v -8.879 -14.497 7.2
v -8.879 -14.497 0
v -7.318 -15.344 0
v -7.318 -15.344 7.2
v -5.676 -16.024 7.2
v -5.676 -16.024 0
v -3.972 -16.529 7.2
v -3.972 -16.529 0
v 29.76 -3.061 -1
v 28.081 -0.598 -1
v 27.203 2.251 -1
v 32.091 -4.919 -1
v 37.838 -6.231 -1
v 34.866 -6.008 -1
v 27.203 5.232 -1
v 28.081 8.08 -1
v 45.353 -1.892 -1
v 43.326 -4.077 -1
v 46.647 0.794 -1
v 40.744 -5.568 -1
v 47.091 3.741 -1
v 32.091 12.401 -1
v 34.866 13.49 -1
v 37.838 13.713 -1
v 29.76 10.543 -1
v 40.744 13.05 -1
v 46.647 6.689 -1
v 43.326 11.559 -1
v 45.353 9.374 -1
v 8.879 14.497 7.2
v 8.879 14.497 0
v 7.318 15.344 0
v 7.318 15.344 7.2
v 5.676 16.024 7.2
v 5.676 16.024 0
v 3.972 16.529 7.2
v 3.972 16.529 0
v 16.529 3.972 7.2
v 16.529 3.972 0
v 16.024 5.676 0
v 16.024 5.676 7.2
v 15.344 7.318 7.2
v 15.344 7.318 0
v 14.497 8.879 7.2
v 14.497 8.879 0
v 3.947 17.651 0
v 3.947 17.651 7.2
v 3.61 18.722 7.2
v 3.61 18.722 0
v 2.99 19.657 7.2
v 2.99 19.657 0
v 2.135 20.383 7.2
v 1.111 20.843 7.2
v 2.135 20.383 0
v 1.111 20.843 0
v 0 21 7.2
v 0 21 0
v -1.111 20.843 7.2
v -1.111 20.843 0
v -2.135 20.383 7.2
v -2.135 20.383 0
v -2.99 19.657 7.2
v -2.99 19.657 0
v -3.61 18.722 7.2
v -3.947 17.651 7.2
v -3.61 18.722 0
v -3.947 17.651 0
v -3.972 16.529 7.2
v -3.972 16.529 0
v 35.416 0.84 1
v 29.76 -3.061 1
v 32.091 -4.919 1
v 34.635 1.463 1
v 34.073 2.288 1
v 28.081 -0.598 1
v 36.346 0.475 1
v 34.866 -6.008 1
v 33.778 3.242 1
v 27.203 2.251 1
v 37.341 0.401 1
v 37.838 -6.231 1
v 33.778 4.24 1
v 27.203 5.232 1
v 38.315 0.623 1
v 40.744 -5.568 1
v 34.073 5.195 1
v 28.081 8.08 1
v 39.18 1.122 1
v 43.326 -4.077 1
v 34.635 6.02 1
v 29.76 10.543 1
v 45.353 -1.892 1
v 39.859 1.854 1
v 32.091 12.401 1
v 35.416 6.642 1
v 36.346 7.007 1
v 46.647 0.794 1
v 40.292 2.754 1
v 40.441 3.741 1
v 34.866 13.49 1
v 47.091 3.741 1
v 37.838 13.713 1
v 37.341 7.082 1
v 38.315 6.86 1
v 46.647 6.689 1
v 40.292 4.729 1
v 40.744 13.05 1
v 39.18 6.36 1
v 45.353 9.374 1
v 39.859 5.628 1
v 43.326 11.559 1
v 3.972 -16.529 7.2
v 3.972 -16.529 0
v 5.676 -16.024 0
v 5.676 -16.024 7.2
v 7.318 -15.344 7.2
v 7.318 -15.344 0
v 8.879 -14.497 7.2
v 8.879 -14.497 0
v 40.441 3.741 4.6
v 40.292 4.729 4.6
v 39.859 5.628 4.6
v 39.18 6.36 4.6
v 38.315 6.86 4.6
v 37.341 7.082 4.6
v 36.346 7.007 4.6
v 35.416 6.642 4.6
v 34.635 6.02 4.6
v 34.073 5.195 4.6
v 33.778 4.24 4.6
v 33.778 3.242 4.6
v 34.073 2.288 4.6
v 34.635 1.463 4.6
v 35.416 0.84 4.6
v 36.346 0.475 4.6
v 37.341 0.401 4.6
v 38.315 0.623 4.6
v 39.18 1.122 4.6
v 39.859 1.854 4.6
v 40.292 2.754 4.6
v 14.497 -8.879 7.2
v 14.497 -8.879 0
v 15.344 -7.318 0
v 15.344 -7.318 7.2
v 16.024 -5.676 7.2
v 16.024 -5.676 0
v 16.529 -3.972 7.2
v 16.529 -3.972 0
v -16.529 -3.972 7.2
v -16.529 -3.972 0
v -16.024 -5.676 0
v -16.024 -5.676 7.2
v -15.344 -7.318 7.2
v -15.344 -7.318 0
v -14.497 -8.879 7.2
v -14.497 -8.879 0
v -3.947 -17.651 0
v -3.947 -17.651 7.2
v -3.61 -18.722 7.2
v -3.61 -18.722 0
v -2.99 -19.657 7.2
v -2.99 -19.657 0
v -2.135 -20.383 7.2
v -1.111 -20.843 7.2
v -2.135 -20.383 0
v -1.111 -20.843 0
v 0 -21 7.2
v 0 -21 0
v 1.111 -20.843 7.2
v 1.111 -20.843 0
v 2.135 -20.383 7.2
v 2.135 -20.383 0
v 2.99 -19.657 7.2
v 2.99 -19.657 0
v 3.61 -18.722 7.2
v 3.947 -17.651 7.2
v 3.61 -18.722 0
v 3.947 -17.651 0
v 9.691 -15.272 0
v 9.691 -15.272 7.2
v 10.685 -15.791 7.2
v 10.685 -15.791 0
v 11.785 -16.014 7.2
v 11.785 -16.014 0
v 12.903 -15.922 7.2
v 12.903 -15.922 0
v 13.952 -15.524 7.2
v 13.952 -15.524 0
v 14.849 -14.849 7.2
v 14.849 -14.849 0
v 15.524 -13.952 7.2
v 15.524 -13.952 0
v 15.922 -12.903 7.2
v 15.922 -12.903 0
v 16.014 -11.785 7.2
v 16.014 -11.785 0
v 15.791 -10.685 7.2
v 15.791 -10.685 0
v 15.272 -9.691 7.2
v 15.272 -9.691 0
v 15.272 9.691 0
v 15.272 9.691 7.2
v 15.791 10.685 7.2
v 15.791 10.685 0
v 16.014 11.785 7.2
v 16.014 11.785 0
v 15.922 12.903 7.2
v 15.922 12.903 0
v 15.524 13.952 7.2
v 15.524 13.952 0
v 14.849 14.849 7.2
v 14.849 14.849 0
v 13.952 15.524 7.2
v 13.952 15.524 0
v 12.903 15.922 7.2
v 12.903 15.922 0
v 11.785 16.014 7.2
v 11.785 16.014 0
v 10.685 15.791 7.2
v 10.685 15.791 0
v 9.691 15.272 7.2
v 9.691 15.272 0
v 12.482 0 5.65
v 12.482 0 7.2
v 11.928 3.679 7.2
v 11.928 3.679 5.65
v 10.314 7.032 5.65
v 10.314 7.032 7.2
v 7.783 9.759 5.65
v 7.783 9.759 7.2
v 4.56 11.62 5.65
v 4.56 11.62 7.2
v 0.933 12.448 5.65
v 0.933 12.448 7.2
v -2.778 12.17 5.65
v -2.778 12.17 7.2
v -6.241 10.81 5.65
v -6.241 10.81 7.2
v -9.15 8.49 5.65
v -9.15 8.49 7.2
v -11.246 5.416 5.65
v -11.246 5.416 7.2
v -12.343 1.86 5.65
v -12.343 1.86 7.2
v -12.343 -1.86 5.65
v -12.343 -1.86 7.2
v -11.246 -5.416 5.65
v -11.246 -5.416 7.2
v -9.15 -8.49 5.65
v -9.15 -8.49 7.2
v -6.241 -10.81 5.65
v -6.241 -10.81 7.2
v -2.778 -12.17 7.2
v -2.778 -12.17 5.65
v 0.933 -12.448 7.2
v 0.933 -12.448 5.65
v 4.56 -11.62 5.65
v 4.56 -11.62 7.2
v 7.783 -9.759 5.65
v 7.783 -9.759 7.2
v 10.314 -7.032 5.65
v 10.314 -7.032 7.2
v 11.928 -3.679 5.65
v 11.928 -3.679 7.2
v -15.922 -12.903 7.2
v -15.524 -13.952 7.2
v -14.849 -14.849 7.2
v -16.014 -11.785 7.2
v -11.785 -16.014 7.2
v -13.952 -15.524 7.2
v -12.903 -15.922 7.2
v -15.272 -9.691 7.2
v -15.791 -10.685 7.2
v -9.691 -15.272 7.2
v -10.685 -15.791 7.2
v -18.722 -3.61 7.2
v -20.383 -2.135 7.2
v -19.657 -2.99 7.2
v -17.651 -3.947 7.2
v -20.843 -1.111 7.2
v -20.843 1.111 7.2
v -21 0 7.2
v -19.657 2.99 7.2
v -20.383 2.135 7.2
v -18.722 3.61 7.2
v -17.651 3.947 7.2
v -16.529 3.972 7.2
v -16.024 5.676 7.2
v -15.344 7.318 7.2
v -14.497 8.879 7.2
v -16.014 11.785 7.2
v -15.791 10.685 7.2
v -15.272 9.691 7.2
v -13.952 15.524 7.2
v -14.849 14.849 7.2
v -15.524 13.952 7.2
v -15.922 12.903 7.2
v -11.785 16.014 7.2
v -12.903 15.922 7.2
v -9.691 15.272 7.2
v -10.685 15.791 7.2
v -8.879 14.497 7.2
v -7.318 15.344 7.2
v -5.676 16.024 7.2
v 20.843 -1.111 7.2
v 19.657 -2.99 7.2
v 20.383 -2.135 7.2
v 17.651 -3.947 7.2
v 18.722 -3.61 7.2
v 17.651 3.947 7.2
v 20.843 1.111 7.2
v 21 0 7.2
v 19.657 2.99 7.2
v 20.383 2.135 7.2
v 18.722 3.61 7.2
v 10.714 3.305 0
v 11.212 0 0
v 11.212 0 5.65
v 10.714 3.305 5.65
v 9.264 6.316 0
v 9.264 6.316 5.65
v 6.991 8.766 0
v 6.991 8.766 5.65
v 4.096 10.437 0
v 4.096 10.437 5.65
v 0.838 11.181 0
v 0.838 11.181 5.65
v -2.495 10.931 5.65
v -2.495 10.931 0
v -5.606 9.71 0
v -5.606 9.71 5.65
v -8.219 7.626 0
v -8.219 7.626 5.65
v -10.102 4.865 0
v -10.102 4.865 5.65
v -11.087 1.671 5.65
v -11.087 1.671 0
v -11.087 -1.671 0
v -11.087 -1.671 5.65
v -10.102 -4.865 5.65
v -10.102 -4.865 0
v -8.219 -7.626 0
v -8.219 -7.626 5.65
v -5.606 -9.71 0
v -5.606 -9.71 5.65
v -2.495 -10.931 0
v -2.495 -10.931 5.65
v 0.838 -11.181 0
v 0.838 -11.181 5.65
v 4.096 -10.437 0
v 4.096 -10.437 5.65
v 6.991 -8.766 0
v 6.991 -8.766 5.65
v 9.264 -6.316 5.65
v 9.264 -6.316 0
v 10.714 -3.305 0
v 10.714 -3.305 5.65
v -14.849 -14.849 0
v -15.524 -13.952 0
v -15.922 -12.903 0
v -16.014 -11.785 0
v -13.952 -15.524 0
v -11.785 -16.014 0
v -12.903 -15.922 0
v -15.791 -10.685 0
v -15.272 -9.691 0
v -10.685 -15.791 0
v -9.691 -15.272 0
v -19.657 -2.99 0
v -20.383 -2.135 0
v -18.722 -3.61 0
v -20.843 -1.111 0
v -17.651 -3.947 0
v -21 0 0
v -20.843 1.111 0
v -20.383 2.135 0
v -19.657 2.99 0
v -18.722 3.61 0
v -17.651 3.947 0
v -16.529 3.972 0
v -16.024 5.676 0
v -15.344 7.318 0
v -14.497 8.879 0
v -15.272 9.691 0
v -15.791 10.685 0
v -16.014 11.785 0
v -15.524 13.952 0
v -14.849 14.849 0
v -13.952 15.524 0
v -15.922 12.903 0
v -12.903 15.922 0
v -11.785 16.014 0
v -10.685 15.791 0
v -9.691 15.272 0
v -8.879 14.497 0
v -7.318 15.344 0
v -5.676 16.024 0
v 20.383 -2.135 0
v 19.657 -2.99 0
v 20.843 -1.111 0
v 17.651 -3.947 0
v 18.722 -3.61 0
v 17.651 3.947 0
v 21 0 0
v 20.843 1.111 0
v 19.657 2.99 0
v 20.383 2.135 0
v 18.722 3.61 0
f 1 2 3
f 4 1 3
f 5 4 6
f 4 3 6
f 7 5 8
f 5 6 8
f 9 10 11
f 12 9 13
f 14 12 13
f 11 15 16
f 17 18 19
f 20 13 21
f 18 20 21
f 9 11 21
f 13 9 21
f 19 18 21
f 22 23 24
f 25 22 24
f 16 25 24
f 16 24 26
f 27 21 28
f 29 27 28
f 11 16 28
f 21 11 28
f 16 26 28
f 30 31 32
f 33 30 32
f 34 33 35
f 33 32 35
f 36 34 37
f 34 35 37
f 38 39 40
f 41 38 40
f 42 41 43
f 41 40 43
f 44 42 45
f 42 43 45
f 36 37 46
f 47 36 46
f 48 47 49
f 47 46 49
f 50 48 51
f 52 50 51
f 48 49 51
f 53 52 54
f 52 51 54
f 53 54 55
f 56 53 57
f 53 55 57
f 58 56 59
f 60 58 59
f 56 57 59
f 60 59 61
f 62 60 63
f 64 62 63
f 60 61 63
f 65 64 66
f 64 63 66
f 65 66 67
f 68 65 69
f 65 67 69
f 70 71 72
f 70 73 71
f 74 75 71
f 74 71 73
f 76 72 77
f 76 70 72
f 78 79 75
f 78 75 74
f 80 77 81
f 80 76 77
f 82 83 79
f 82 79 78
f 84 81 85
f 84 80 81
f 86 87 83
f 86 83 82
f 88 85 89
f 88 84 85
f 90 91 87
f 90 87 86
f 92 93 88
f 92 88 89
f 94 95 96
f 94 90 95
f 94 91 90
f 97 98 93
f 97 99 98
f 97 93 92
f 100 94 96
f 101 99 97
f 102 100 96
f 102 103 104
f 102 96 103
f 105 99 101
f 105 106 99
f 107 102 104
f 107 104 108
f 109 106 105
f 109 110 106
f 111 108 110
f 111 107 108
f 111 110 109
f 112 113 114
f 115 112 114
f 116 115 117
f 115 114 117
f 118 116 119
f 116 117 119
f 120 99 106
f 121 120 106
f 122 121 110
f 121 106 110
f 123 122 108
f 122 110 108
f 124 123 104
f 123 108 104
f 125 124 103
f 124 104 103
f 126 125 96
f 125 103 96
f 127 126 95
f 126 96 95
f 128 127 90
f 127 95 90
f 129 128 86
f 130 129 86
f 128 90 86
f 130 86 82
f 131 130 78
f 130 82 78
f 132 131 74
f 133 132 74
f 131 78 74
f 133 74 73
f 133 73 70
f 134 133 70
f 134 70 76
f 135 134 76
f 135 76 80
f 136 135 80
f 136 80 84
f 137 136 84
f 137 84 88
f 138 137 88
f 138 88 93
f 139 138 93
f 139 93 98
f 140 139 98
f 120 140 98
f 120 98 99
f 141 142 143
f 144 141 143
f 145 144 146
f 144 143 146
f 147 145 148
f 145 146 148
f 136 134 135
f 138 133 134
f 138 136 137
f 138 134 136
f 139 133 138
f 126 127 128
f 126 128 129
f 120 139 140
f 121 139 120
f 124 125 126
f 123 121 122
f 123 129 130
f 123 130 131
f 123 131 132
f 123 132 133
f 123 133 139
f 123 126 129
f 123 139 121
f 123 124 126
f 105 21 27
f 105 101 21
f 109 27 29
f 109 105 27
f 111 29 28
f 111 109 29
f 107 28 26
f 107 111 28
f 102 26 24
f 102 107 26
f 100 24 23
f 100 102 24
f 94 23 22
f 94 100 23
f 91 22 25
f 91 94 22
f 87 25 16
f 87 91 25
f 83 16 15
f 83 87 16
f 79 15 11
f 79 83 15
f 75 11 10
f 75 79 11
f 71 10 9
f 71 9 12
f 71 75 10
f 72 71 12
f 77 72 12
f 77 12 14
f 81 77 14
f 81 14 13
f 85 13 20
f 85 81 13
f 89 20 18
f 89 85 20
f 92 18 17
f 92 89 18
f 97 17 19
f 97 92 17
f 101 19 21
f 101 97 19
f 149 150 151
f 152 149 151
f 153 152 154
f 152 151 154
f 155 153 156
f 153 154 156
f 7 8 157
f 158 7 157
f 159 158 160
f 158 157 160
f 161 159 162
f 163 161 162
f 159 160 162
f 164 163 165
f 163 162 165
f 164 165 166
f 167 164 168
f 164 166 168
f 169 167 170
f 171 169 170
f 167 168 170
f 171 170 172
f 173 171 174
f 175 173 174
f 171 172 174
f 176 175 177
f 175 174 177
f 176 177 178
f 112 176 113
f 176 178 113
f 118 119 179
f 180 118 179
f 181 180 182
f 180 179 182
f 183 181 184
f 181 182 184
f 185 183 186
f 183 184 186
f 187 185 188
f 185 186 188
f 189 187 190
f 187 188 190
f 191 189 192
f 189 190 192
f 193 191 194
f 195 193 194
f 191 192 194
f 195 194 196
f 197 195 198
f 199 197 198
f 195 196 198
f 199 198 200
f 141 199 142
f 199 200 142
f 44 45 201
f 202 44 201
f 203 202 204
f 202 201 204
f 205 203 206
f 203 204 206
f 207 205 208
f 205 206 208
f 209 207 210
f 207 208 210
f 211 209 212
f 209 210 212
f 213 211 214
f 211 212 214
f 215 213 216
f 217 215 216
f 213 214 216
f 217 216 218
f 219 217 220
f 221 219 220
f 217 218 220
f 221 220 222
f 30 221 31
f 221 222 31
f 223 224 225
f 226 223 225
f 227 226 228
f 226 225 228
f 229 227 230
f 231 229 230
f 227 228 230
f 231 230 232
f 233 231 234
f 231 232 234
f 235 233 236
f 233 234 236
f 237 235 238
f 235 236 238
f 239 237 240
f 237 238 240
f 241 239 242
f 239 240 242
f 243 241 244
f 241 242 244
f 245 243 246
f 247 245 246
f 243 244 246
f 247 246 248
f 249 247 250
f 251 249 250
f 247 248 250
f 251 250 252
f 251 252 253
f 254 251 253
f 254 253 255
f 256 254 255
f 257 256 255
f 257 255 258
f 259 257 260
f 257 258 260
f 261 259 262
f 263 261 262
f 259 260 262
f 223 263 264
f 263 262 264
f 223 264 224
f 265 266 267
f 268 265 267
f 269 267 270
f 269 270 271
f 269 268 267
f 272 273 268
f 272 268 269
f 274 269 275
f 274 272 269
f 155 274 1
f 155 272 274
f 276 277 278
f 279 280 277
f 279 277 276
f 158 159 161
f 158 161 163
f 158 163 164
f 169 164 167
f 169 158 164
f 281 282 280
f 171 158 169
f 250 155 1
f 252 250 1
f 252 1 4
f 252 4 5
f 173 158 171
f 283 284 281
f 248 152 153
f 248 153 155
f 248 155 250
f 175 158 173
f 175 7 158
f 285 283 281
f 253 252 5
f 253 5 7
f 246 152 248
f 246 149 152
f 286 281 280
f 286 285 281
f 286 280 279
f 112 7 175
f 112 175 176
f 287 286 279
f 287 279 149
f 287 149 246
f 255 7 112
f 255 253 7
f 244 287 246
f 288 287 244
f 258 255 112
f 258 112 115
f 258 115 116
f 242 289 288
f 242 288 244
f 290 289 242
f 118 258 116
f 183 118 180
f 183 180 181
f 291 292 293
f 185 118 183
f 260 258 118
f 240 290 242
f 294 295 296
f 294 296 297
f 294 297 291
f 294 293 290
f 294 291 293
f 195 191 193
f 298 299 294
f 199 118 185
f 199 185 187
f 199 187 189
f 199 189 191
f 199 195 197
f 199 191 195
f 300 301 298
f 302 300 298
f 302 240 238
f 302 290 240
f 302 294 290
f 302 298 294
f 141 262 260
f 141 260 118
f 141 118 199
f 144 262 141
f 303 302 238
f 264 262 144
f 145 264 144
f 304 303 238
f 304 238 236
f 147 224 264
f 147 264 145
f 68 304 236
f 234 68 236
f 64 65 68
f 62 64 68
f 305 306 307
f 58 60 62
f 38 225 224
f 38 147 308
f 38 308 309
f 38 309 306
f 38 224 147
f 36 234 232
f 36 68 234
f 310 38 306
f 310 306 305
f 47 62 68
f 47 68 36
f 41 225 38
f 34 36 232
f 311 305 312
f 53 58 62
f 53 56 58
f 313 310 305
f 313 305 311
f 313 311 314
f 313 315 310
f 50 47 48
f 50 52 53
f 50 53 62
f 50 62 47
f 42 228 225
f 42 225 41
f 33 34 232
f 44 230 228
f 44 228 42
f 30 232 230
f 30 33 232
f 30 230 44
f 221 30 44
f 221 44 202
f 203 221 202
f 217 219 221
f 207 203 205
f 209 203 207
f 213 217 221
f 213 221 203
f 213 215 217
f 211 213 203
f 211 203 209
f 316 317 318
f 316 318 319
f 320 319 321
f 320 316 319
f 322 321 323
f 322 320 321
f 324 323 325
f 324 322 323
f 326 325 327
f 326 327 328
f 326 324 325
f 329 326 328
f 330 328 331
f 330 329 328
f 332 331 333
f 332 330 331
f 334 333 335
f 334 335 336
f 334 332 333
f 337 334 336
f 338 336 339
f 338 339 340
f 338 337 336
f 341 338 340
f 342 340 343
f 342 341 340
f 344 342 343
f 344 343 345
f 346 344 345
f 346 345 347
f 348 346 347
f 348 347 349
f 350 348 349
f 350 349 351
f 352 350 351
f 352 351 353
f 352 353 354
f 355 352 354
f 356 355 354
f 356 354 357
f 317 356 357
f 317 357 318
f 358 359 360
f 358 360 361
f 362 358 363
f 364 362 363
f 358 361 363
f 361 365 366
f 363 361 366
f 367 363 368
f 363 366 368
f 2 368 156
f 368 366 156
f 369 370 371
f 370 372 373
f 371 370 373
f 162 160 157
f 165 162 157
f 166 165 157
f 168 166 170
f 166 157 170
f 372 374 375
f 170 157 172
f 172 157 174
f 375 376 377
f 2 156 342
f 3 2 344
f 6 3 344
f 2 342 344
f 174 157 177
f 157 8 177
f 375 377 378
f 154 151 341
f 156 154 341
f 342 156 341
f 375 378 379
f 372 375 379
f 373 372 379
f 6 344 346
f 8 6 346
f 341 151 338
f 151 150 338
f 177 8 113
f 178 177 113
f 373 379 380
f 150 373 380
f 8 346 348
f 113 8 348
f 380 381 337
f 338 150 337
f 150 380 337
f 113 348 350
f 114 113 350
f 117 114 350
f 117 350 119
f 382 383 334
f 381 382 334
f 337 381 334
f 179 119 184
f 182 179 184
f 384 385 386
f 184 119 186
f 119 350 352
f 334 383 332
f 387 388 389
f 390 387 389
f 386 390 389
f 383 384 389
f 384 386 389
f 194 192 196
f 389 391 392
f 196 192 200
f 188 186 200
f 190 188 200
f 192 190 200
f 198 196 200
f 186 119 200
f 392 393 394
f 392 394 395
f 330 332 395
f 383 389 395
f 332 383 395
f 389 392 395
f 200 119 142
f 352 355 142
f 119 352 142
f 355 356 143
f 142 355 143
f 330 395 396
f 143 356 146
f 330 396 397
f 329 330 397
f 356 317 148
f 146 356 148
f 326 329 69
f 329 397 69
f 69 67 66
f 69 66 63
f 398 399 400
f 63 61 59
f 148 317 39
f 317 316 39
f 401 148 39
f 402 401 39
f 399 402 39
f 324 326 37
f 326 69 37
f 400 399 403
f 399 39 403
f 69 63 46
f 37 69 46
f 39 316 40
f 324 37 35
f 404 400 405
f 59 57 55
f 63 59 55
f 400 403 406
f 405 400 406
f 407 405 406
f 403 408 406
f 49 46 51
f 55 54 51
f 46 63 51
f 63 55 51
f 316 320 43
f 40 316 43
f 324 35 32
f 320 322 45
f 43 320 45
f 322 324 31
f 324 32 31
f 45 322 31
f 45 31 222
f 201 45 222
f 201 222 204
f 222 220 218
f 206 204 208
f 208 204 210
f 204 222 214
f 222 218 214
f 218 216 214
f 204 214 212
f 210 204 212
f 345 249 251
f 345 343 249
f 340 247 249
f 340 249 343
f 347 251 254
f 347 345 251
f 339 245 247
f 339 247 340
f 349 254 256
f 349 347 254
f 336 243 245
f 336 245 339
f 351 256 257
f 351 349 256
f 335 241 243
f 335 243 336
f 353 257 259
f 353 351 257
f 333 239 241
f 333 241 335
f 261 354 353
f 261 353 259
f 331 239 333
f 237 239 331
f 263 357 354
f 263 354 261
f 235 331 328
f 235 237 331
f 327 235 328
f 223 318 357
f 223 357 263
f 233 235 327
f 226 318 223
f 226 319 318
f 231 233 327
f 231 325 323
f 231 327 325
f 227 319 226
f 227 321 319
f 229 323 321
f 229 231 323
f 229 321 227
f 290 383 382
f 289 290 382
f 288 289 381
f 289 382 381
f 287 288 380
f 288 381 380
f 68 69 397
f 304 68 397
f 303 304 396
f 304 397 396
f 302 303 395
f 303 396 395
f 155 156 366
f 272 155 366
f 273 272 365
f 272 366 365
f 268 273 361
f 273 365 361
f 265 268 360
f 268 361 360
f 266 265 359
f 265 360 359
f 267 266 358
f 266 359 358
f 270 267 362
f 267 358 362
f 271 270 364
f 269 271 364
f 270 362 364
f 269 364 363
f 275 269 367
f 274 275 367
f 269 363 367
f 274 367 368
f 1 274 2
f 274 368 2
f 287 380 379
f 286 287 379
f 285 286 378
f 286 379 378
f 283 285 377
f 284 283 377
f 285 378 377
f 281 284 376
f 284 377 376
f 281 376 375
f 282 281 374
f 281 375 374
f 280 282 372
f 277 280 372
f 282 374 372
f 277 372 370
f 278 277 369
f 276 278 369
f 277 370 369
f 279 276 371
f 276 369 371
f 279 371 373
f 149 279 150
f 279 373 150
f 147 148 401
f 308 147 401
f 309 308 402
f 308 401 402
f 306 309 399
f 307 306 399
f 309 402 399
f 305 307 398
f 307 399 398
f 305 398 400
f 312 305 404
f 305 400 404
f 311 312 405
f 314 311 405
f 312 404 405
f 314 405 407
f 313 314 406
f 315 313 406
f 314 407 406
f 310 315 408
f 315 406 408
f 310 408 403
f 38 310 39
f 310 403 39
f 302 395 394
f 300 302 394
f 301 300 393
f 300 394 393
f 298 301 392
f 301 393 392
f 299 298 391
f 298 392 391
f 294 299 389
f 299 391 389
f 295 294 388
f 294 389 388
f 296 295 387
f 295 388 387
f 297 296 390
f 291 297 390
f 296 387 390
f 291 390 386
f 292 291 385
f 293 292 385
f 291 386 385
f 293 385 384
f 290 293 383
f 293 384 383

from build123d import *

# Parameters (mm, degrees)
F0_R      = 4.6625
F1_DEPTH  = 7.2
F0_R_2    = 11.2125
F2_R      = 12.4825
F2_R_2    = 11.2125
F3_DEPTH  = 1.55
F4_R      = 5.8
F5_DEPTH  = 1
F6_DEPTH  = 8.4
F7_R      = 3.5
F8_DEPTH  = 25
F9_R      = 10
F9_R_2    = 3.35
F10_DEPTH = 1
F11_DEPTH = 4.6
F12_DEPTH = 1
F13_DEPTH = 1


with BuildPart() as f1:
    # F0 (on Top) → F1 (new body)
    with BuildSketch(Plane.XY):
        Circle(F0_R)
    extrude(amount=F1_DEPTH)

    # F4 (on Top) → F5 (join)
    with BuildSketch(Plane.XY):
        Circle(F4_R)
    extrude(amount=F5_DEPTH)

    # F0 (on Top) → F6 (join)
    with BuildSketch(Plane.XY):
        Circle(F0_R)
    extrude(amount=F6_DEPTH)

    # F7 (on face) → F8 (cut)
    with BuildSketch(Plane.XY.offset(8.4)):
        Circle(F7_R)
    extrude(amount=-F8_DEPTH, mode=Mode.SUBTRACT)

    # F12 (add): a face of the model
    f12_faces = [f1.faces().sort_by_distance(p)[0] for p in [
        (-5.6359512268, 0, 0),
    ]]
    extrude(f12_faces, amount=F12_DEPTH)


with BuildPart() as f1b:
    # F0 (on Top) → F1, piece 2 (new body)
    with BuildSketch(Plane.XY):
        with BuildLine():
            ThreePointArc((-8.8792741158, 14.4968441799), (-14.8492424049, 14.8492424049), (-14.4968441799, 8.8792741158))
            ThreePointArc((-14.4968441799, 8.8792741158), (-15.7059520527, 6.5056183502), (-16.5294117647, 3.9722218861))
            ThreePointArc((-16.5294117647, 3.9722218861), (-21, 0), (-16.5294117647, -3.9722218861))
            ThreePointArc((-16.5294117647, -3.9722218861), (-15.7059520527, -6.5056183502), (-14.4968441799, -8.8792741158))
            ThreePointArc((-14.4968441799, -8.8792741158), (-14.8492424049, -14.8492424049), (-8.8792741158, -14.4968441799))
            ThreePointArc((-8.8792741158, -14.4968441799), (-6.5056183502, -15.7059520527), (-3.9722218861, -16.5294117647))
            ThreePointArc((-3.9722218861, -16.5294117647), (0, -21), (3.9722218861, -16.5294117647))
            ThreePointArc((3.9722218861, -16.5294117647), (6.5056183502, -15.7059520527), (8.8792741158, -14.4968441799))
            ThreePointArc((8.8792741158, -14.4968441799), (14.8492424049, -14.8492424049), (14.4968441799, -8.8792741158))
            ThreePointArc((14.4968441799, -8.8792741158), (15.7059520527, -6.5056183502), (16.5294117647, -3.9722218861))
            ThreePointArc((16.5294117647, -3.9722218861), (21, 0), (16.5294117647, 3.9722218861))
            ThreePointArc((16.5294117647, 3.9722218861), (15.7059520527, 6.5056183502), (14.4968441799, 8.8792741158))
            ThreePointArc((14.4968441799, 8.8792741158), (14.8492424049, 14.8492424049), (8.8792741158, 14.4968441799))
            ThreePointArc((8.8792741158, 14.4968441799), (6.5056183502, 15.7059520527), (3.9722218861, 16.5294117647))
            ThreePointArc((3.9722218861, 16.5294117647), (0, 21), (-3.9722218861, 16.5294117647))
            ThreePointArc((-3.9722218861, 16.5294117647), (-6.5056183502, 15.7059520527), (-8.8792741158, 14.4968441799))
        make_face()
        Circle(F0_R_2, mode=Mode.SUBTRACT)
    extrude(amount=F1_DEPTH)

    # F2 (on face) → F3 (cut)
    with BuildSketch(Plane.XY.offset(7.2)):
        Circle(F2_R)
        Circle(F2_R_2, mode=Mode.SUBTRACT)
    extrude(amount=-F3_DEPTH, mode=Mode.SUBTRACT)


with BuildPart() as f10:
    # F9 (on Top) → F10 (new body)
    with BuildSketch(Plane.XY):
        with Locations((37.0909944177, 3.7411744706)):
            Circle(F9_R)
        with Locations((37.0909944177, 3.7411744706)):
            Circle(F9_R_2, mode=Mode.SUBTRACT)
    extrude(amount=F10_DEPTH)

    # F9 (on Top) → F11 (join)
    with BuildSketch(Plane.XY):
        with Locations((37.0909944177, 3.7411744706)):
            Circle(F9_R_2)
    extrude(amount=F11_DEPTH)

    # F9 (on Top) → F13 (join)
    with BuildSketch(Plane.XY):
        with Locations((37.0909944177, 3.7411744706)):
            Circle(F9_R)
        with Locations((37.0909944177, 3.7411744706)):
            Circle(F9_R_2, mode=Mode.SUBTRACT)
        with Locations((37.0909944177, 3.7411744706)):
            Circle(F9_R_2)
    extrude(amount=-F13_DEPTH)


solid = Compound([f1b.part, f10.part])
